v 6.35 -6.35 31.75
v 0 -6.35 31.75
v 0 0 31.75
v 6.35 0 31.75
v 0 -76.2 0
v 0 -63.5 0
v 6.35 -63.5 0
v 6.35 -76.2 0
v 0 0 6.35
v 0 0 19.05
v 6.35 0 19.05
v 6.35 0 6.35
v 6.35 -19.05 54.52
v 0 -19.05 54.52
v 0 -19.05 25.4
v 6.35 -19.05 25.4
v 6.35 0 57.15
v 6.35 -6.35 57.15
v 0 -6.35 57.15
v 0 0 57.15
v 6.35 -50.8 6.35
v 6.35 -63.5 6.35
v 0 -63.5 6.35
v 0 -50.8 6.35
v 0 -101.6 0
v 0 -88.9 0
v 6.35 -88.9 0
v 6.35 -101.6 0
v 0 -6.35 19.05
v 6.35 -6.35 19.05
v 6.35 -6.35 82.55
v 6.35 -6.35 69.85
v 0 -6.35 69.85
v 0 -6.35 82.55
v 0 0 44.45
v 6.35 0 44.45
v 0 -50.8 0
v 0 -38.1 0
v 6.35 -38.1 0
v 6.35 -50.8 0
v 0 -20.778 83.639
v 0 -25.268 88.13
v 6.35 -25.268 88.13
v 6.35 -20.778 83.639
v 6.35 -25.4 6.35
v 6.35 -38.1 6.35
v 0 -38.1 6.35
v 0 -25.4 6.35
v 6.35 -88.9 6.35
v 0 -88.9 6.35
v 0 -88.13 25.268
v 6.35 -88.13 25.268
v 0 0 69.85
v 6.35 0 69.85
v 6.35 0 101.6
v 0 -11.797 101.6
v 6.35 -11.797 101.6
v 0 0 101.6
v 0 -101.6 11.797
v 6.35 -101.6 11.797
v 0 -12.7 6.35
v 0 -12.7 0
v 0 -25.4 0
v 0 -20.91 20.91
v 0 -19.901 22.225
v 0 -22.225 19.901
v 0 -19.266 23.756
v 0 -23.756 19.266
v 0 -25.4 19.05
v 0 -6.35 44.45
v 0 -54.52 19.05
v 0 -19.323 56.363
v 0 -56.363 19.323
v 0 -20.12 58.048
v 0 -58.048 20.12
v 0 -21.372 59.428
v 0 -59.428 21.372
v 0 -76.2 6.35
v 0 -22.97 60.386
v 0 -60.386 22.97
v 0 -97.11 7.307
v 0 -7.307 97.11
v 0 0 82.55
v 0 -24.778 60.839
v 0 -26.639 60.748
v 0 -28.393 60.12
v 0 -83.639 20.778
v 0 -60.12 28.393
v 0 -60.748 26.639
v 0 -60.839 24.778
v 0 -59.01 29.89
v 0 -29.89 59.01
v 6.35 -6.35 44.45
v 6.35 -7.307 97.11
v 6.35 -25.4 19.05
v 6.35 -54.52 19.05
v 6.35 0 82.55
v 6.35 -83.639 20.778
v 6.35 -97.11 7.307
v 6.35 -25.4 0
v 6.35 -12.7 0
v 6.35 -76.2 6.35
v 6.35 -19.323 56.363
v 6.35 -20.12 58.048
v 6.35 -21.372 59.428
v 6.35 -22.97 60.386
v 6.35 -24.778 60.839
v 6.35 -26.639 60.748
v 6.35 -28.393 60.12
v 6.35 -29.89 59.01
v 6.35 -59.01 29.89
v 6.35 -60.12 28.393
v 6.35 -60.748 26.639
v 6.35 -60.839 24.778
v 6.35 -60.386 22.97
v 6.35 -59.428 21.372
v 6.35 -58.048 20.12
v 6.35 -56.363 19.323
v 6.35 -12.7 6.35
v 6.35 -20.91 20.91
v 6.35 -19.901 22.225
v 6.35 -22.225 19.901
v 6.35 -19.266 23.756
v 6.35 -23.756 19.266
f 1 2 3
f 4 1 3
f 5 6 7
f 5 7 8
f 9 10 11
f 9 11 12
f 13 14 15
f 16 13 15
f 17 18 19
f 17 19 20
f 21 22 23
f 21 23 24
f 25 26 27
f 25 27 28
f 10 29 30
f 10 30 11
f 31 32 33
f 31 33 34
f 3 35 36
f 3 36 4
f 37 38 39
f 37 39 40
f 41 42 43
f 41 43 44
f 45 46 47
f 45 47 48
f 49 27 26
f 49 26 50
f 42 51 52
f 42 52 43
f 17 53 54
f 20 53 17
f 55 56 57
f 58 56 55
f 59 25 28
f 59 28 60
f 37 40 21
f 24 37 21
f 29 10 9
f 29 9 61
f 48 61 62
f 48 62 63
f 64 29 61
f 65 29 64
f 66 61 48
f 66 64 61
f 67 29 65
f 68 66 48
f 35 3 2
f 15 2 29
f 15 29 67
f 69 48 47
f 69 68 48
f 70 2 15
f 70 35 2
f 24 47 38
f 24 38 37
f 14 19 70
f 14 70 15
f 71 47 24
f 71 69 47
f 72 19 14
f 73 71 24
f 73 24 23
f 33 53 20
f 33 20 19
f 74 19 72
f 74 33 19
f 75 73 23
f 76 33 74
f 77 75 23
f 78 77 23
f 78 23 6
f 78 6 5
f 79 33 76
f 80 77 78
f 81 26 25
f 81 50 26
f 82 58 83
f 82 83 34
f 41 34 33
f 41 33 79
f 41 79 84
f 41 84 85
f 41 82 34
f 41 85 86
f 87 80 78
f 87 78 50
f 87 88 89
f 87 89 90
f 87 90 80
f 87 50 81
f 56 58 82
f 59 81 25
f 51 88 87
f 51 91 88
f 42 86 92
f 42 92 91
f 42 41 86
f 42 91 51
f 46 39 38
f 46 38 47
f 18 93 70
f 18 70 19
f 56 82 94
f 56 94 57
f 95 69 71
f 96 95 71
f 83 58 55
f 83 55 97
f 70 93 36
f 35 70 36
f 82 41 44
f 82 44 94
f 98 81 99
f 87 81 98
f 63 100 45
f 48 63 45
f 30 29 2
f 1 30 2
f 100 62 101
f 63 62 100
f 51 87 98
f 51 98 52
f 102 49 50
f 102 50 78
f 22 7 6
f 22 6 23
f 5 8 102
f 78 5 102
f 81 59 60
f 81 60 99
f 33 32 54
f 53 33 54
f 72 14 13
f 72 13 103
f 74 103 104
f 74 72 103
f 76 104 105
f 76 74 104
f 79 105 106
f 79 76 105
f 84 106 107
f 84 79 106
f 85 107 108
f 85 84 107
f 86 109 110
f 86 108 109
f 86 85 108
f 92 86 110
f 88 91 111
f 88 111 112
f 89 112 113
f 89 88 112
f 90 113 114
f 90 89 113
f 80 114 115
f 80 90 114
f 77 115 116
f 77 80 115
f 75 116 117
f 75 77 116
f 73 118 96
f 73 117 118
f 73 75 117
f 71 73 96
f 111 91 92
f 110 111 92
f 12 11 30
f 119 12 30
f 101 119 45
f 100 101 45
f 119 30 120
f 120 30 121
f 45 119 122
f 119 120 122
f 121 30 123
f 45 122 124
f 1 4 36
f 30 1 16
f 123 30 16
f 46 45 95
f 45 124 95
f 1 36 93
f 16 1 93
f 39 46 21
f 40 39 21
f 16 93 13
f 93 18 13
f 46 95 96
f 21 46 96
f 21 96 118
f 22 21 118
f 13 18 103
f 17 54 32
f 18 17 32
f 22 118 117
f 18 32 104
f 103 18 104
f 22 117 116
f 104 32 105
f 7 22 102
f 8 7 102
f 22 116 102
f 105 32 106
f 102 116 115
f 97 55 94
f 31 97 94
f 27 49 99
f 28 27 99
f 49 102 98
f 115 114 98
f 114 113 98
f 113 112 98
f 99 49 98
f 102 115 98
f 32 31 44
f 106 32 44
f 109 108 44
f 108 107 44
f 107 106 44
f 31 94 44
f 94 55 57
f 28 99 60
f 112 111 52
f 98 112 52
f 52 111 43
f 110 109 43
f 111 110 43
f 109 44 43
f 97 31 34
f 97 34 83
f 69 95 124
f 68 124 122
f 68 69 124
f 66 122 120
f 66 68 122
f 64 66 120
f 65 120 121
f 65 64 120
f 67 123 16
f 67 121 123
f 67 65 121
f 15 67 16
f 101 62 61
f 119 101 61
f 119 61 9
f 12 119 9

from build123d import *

# Parameters (mm, degrees)
PAD005_DEPTH           = 6.35
SKETCH004_W            = 12.7
SKETCH004_H            = 6.35
POCKET_DEPTH           = 0.001
POCKET_DEPTH_BACK      = 6.351
LINEARPATTERN_COUNT    = 7
LINEARPATTERN_PITCH    = 25.4
SKETCH005_W            = 6.35
SKETCH005_H            = 12.7
POCKET001_DEPTH        = 0.001
POCKET001_DEPTH_BACK   = 6.351
LINEARPATTERN001_COUNT = 3
LINEARPATTERN001_PITCH = 25.4
POCKET005_DEPTH        = 0.001
POCKET005_DEPTH_BACK   = 6.351


with BuildPart() as part:
    # MirroredSketch001 → Pad005 (new body)
    with BuildSketch(Plane.YZ):
        Polygon((-88.129616, 25.267823), (-25.267823, 88.129616), (-20.777695, 83.639488), (-7.307311, 97.109872), (-11.797439, 101.6), (0, 101.6), (0, 0), (-101.6, 0), (-101.6, 11.797439), (-97.109872, 7.307311), (-83.639488, 20.777695), align=None)
    extrude(amount=PAD005_DEPTH)

    # Sketch004 (on YZ_Plane003 of Origin007) → Pocket (cut, two sides)
    with BuildSketch(Plane.YZ) as pocket_sk:
        with Locations((-6.35, 3.175)):
            Rectangle(SKETCH004_W, SKETCH004_H)
    pocket = extrude(amount=-POCKET_DEPTH, mode=Mode.SUBTRACT) + extrude(pocket_sk.sketch, amount=POCKET_DEPTH_BACK, mode=Mode.SUBTRACT)

    # LinearPattern: Pocket ×7
    with Locations(*[(0, -i * LINEARPATTERN_PITCH, 0) for i in range(1, LINEARPATTERN_COUNT)]):
        add(pocket, mode=Mode.SUBTRACT)

    # Sketch005 (on YZ_Plane003 of Origin007) → Pocket001 (cut, two sides)
    with BuildSketch(Plane.YZ) as pocket001_sk:
        with Locations((-3.175, 25.4)):
            Rectangle(SKETCH005_W, SKETCH005_H)
    pocket001 = extrude(amount=-POCKET001_DEPTH, mode=Mode.SUBTRACT) + extrude(pocket001_sk.sketch, amount=POCKET001_DEPTH_BACK, mode=Mode.SUBTRACT)

    # LinearPattern001: Pocket001 ×3
    with Locations(*[(0, 0, i * LINEARPATTERN001_PITCH) for i in range(1, LINEARPATTERN001_COUNT)]):
        add(pocket001, mode=Mode.SUBTRACT)

    # Sketch012 → Pocket005 (cut, two sides)
    with BuildSketch(Plane.YZ) as pocket005_sk:
        with BuildLine():
            Line((-19.05, 54.519744), (-19.05, 25.4))
            ThreePointArc((-25.4, 19.05), (-20.909872, 20.909872), (-19.05, 25.4))
            Line((-25.4, 19.05), (-54.519744, 19.05))
            ThreePointArc((-59.009872, 29.890128), (-60.386379, 22.96996), (-54.519744, 19.05))
            Line((-59.009872, 29.890128), (-29.890128, 59.009872))
            ThreePointArc((-19.05, 54.519744), (-22.96996, 60.386379), (-29.890128, 59.009872))
        make_face()
    extrude(amount=-POCKET005_DEPTH, mode=Mode.SUBTRACT)
    extrude(pocket005_sk.sketch, amount=POCKET005_DEPTH_BACK, mode=Mode.SUBTRACT)


solid = part.part
